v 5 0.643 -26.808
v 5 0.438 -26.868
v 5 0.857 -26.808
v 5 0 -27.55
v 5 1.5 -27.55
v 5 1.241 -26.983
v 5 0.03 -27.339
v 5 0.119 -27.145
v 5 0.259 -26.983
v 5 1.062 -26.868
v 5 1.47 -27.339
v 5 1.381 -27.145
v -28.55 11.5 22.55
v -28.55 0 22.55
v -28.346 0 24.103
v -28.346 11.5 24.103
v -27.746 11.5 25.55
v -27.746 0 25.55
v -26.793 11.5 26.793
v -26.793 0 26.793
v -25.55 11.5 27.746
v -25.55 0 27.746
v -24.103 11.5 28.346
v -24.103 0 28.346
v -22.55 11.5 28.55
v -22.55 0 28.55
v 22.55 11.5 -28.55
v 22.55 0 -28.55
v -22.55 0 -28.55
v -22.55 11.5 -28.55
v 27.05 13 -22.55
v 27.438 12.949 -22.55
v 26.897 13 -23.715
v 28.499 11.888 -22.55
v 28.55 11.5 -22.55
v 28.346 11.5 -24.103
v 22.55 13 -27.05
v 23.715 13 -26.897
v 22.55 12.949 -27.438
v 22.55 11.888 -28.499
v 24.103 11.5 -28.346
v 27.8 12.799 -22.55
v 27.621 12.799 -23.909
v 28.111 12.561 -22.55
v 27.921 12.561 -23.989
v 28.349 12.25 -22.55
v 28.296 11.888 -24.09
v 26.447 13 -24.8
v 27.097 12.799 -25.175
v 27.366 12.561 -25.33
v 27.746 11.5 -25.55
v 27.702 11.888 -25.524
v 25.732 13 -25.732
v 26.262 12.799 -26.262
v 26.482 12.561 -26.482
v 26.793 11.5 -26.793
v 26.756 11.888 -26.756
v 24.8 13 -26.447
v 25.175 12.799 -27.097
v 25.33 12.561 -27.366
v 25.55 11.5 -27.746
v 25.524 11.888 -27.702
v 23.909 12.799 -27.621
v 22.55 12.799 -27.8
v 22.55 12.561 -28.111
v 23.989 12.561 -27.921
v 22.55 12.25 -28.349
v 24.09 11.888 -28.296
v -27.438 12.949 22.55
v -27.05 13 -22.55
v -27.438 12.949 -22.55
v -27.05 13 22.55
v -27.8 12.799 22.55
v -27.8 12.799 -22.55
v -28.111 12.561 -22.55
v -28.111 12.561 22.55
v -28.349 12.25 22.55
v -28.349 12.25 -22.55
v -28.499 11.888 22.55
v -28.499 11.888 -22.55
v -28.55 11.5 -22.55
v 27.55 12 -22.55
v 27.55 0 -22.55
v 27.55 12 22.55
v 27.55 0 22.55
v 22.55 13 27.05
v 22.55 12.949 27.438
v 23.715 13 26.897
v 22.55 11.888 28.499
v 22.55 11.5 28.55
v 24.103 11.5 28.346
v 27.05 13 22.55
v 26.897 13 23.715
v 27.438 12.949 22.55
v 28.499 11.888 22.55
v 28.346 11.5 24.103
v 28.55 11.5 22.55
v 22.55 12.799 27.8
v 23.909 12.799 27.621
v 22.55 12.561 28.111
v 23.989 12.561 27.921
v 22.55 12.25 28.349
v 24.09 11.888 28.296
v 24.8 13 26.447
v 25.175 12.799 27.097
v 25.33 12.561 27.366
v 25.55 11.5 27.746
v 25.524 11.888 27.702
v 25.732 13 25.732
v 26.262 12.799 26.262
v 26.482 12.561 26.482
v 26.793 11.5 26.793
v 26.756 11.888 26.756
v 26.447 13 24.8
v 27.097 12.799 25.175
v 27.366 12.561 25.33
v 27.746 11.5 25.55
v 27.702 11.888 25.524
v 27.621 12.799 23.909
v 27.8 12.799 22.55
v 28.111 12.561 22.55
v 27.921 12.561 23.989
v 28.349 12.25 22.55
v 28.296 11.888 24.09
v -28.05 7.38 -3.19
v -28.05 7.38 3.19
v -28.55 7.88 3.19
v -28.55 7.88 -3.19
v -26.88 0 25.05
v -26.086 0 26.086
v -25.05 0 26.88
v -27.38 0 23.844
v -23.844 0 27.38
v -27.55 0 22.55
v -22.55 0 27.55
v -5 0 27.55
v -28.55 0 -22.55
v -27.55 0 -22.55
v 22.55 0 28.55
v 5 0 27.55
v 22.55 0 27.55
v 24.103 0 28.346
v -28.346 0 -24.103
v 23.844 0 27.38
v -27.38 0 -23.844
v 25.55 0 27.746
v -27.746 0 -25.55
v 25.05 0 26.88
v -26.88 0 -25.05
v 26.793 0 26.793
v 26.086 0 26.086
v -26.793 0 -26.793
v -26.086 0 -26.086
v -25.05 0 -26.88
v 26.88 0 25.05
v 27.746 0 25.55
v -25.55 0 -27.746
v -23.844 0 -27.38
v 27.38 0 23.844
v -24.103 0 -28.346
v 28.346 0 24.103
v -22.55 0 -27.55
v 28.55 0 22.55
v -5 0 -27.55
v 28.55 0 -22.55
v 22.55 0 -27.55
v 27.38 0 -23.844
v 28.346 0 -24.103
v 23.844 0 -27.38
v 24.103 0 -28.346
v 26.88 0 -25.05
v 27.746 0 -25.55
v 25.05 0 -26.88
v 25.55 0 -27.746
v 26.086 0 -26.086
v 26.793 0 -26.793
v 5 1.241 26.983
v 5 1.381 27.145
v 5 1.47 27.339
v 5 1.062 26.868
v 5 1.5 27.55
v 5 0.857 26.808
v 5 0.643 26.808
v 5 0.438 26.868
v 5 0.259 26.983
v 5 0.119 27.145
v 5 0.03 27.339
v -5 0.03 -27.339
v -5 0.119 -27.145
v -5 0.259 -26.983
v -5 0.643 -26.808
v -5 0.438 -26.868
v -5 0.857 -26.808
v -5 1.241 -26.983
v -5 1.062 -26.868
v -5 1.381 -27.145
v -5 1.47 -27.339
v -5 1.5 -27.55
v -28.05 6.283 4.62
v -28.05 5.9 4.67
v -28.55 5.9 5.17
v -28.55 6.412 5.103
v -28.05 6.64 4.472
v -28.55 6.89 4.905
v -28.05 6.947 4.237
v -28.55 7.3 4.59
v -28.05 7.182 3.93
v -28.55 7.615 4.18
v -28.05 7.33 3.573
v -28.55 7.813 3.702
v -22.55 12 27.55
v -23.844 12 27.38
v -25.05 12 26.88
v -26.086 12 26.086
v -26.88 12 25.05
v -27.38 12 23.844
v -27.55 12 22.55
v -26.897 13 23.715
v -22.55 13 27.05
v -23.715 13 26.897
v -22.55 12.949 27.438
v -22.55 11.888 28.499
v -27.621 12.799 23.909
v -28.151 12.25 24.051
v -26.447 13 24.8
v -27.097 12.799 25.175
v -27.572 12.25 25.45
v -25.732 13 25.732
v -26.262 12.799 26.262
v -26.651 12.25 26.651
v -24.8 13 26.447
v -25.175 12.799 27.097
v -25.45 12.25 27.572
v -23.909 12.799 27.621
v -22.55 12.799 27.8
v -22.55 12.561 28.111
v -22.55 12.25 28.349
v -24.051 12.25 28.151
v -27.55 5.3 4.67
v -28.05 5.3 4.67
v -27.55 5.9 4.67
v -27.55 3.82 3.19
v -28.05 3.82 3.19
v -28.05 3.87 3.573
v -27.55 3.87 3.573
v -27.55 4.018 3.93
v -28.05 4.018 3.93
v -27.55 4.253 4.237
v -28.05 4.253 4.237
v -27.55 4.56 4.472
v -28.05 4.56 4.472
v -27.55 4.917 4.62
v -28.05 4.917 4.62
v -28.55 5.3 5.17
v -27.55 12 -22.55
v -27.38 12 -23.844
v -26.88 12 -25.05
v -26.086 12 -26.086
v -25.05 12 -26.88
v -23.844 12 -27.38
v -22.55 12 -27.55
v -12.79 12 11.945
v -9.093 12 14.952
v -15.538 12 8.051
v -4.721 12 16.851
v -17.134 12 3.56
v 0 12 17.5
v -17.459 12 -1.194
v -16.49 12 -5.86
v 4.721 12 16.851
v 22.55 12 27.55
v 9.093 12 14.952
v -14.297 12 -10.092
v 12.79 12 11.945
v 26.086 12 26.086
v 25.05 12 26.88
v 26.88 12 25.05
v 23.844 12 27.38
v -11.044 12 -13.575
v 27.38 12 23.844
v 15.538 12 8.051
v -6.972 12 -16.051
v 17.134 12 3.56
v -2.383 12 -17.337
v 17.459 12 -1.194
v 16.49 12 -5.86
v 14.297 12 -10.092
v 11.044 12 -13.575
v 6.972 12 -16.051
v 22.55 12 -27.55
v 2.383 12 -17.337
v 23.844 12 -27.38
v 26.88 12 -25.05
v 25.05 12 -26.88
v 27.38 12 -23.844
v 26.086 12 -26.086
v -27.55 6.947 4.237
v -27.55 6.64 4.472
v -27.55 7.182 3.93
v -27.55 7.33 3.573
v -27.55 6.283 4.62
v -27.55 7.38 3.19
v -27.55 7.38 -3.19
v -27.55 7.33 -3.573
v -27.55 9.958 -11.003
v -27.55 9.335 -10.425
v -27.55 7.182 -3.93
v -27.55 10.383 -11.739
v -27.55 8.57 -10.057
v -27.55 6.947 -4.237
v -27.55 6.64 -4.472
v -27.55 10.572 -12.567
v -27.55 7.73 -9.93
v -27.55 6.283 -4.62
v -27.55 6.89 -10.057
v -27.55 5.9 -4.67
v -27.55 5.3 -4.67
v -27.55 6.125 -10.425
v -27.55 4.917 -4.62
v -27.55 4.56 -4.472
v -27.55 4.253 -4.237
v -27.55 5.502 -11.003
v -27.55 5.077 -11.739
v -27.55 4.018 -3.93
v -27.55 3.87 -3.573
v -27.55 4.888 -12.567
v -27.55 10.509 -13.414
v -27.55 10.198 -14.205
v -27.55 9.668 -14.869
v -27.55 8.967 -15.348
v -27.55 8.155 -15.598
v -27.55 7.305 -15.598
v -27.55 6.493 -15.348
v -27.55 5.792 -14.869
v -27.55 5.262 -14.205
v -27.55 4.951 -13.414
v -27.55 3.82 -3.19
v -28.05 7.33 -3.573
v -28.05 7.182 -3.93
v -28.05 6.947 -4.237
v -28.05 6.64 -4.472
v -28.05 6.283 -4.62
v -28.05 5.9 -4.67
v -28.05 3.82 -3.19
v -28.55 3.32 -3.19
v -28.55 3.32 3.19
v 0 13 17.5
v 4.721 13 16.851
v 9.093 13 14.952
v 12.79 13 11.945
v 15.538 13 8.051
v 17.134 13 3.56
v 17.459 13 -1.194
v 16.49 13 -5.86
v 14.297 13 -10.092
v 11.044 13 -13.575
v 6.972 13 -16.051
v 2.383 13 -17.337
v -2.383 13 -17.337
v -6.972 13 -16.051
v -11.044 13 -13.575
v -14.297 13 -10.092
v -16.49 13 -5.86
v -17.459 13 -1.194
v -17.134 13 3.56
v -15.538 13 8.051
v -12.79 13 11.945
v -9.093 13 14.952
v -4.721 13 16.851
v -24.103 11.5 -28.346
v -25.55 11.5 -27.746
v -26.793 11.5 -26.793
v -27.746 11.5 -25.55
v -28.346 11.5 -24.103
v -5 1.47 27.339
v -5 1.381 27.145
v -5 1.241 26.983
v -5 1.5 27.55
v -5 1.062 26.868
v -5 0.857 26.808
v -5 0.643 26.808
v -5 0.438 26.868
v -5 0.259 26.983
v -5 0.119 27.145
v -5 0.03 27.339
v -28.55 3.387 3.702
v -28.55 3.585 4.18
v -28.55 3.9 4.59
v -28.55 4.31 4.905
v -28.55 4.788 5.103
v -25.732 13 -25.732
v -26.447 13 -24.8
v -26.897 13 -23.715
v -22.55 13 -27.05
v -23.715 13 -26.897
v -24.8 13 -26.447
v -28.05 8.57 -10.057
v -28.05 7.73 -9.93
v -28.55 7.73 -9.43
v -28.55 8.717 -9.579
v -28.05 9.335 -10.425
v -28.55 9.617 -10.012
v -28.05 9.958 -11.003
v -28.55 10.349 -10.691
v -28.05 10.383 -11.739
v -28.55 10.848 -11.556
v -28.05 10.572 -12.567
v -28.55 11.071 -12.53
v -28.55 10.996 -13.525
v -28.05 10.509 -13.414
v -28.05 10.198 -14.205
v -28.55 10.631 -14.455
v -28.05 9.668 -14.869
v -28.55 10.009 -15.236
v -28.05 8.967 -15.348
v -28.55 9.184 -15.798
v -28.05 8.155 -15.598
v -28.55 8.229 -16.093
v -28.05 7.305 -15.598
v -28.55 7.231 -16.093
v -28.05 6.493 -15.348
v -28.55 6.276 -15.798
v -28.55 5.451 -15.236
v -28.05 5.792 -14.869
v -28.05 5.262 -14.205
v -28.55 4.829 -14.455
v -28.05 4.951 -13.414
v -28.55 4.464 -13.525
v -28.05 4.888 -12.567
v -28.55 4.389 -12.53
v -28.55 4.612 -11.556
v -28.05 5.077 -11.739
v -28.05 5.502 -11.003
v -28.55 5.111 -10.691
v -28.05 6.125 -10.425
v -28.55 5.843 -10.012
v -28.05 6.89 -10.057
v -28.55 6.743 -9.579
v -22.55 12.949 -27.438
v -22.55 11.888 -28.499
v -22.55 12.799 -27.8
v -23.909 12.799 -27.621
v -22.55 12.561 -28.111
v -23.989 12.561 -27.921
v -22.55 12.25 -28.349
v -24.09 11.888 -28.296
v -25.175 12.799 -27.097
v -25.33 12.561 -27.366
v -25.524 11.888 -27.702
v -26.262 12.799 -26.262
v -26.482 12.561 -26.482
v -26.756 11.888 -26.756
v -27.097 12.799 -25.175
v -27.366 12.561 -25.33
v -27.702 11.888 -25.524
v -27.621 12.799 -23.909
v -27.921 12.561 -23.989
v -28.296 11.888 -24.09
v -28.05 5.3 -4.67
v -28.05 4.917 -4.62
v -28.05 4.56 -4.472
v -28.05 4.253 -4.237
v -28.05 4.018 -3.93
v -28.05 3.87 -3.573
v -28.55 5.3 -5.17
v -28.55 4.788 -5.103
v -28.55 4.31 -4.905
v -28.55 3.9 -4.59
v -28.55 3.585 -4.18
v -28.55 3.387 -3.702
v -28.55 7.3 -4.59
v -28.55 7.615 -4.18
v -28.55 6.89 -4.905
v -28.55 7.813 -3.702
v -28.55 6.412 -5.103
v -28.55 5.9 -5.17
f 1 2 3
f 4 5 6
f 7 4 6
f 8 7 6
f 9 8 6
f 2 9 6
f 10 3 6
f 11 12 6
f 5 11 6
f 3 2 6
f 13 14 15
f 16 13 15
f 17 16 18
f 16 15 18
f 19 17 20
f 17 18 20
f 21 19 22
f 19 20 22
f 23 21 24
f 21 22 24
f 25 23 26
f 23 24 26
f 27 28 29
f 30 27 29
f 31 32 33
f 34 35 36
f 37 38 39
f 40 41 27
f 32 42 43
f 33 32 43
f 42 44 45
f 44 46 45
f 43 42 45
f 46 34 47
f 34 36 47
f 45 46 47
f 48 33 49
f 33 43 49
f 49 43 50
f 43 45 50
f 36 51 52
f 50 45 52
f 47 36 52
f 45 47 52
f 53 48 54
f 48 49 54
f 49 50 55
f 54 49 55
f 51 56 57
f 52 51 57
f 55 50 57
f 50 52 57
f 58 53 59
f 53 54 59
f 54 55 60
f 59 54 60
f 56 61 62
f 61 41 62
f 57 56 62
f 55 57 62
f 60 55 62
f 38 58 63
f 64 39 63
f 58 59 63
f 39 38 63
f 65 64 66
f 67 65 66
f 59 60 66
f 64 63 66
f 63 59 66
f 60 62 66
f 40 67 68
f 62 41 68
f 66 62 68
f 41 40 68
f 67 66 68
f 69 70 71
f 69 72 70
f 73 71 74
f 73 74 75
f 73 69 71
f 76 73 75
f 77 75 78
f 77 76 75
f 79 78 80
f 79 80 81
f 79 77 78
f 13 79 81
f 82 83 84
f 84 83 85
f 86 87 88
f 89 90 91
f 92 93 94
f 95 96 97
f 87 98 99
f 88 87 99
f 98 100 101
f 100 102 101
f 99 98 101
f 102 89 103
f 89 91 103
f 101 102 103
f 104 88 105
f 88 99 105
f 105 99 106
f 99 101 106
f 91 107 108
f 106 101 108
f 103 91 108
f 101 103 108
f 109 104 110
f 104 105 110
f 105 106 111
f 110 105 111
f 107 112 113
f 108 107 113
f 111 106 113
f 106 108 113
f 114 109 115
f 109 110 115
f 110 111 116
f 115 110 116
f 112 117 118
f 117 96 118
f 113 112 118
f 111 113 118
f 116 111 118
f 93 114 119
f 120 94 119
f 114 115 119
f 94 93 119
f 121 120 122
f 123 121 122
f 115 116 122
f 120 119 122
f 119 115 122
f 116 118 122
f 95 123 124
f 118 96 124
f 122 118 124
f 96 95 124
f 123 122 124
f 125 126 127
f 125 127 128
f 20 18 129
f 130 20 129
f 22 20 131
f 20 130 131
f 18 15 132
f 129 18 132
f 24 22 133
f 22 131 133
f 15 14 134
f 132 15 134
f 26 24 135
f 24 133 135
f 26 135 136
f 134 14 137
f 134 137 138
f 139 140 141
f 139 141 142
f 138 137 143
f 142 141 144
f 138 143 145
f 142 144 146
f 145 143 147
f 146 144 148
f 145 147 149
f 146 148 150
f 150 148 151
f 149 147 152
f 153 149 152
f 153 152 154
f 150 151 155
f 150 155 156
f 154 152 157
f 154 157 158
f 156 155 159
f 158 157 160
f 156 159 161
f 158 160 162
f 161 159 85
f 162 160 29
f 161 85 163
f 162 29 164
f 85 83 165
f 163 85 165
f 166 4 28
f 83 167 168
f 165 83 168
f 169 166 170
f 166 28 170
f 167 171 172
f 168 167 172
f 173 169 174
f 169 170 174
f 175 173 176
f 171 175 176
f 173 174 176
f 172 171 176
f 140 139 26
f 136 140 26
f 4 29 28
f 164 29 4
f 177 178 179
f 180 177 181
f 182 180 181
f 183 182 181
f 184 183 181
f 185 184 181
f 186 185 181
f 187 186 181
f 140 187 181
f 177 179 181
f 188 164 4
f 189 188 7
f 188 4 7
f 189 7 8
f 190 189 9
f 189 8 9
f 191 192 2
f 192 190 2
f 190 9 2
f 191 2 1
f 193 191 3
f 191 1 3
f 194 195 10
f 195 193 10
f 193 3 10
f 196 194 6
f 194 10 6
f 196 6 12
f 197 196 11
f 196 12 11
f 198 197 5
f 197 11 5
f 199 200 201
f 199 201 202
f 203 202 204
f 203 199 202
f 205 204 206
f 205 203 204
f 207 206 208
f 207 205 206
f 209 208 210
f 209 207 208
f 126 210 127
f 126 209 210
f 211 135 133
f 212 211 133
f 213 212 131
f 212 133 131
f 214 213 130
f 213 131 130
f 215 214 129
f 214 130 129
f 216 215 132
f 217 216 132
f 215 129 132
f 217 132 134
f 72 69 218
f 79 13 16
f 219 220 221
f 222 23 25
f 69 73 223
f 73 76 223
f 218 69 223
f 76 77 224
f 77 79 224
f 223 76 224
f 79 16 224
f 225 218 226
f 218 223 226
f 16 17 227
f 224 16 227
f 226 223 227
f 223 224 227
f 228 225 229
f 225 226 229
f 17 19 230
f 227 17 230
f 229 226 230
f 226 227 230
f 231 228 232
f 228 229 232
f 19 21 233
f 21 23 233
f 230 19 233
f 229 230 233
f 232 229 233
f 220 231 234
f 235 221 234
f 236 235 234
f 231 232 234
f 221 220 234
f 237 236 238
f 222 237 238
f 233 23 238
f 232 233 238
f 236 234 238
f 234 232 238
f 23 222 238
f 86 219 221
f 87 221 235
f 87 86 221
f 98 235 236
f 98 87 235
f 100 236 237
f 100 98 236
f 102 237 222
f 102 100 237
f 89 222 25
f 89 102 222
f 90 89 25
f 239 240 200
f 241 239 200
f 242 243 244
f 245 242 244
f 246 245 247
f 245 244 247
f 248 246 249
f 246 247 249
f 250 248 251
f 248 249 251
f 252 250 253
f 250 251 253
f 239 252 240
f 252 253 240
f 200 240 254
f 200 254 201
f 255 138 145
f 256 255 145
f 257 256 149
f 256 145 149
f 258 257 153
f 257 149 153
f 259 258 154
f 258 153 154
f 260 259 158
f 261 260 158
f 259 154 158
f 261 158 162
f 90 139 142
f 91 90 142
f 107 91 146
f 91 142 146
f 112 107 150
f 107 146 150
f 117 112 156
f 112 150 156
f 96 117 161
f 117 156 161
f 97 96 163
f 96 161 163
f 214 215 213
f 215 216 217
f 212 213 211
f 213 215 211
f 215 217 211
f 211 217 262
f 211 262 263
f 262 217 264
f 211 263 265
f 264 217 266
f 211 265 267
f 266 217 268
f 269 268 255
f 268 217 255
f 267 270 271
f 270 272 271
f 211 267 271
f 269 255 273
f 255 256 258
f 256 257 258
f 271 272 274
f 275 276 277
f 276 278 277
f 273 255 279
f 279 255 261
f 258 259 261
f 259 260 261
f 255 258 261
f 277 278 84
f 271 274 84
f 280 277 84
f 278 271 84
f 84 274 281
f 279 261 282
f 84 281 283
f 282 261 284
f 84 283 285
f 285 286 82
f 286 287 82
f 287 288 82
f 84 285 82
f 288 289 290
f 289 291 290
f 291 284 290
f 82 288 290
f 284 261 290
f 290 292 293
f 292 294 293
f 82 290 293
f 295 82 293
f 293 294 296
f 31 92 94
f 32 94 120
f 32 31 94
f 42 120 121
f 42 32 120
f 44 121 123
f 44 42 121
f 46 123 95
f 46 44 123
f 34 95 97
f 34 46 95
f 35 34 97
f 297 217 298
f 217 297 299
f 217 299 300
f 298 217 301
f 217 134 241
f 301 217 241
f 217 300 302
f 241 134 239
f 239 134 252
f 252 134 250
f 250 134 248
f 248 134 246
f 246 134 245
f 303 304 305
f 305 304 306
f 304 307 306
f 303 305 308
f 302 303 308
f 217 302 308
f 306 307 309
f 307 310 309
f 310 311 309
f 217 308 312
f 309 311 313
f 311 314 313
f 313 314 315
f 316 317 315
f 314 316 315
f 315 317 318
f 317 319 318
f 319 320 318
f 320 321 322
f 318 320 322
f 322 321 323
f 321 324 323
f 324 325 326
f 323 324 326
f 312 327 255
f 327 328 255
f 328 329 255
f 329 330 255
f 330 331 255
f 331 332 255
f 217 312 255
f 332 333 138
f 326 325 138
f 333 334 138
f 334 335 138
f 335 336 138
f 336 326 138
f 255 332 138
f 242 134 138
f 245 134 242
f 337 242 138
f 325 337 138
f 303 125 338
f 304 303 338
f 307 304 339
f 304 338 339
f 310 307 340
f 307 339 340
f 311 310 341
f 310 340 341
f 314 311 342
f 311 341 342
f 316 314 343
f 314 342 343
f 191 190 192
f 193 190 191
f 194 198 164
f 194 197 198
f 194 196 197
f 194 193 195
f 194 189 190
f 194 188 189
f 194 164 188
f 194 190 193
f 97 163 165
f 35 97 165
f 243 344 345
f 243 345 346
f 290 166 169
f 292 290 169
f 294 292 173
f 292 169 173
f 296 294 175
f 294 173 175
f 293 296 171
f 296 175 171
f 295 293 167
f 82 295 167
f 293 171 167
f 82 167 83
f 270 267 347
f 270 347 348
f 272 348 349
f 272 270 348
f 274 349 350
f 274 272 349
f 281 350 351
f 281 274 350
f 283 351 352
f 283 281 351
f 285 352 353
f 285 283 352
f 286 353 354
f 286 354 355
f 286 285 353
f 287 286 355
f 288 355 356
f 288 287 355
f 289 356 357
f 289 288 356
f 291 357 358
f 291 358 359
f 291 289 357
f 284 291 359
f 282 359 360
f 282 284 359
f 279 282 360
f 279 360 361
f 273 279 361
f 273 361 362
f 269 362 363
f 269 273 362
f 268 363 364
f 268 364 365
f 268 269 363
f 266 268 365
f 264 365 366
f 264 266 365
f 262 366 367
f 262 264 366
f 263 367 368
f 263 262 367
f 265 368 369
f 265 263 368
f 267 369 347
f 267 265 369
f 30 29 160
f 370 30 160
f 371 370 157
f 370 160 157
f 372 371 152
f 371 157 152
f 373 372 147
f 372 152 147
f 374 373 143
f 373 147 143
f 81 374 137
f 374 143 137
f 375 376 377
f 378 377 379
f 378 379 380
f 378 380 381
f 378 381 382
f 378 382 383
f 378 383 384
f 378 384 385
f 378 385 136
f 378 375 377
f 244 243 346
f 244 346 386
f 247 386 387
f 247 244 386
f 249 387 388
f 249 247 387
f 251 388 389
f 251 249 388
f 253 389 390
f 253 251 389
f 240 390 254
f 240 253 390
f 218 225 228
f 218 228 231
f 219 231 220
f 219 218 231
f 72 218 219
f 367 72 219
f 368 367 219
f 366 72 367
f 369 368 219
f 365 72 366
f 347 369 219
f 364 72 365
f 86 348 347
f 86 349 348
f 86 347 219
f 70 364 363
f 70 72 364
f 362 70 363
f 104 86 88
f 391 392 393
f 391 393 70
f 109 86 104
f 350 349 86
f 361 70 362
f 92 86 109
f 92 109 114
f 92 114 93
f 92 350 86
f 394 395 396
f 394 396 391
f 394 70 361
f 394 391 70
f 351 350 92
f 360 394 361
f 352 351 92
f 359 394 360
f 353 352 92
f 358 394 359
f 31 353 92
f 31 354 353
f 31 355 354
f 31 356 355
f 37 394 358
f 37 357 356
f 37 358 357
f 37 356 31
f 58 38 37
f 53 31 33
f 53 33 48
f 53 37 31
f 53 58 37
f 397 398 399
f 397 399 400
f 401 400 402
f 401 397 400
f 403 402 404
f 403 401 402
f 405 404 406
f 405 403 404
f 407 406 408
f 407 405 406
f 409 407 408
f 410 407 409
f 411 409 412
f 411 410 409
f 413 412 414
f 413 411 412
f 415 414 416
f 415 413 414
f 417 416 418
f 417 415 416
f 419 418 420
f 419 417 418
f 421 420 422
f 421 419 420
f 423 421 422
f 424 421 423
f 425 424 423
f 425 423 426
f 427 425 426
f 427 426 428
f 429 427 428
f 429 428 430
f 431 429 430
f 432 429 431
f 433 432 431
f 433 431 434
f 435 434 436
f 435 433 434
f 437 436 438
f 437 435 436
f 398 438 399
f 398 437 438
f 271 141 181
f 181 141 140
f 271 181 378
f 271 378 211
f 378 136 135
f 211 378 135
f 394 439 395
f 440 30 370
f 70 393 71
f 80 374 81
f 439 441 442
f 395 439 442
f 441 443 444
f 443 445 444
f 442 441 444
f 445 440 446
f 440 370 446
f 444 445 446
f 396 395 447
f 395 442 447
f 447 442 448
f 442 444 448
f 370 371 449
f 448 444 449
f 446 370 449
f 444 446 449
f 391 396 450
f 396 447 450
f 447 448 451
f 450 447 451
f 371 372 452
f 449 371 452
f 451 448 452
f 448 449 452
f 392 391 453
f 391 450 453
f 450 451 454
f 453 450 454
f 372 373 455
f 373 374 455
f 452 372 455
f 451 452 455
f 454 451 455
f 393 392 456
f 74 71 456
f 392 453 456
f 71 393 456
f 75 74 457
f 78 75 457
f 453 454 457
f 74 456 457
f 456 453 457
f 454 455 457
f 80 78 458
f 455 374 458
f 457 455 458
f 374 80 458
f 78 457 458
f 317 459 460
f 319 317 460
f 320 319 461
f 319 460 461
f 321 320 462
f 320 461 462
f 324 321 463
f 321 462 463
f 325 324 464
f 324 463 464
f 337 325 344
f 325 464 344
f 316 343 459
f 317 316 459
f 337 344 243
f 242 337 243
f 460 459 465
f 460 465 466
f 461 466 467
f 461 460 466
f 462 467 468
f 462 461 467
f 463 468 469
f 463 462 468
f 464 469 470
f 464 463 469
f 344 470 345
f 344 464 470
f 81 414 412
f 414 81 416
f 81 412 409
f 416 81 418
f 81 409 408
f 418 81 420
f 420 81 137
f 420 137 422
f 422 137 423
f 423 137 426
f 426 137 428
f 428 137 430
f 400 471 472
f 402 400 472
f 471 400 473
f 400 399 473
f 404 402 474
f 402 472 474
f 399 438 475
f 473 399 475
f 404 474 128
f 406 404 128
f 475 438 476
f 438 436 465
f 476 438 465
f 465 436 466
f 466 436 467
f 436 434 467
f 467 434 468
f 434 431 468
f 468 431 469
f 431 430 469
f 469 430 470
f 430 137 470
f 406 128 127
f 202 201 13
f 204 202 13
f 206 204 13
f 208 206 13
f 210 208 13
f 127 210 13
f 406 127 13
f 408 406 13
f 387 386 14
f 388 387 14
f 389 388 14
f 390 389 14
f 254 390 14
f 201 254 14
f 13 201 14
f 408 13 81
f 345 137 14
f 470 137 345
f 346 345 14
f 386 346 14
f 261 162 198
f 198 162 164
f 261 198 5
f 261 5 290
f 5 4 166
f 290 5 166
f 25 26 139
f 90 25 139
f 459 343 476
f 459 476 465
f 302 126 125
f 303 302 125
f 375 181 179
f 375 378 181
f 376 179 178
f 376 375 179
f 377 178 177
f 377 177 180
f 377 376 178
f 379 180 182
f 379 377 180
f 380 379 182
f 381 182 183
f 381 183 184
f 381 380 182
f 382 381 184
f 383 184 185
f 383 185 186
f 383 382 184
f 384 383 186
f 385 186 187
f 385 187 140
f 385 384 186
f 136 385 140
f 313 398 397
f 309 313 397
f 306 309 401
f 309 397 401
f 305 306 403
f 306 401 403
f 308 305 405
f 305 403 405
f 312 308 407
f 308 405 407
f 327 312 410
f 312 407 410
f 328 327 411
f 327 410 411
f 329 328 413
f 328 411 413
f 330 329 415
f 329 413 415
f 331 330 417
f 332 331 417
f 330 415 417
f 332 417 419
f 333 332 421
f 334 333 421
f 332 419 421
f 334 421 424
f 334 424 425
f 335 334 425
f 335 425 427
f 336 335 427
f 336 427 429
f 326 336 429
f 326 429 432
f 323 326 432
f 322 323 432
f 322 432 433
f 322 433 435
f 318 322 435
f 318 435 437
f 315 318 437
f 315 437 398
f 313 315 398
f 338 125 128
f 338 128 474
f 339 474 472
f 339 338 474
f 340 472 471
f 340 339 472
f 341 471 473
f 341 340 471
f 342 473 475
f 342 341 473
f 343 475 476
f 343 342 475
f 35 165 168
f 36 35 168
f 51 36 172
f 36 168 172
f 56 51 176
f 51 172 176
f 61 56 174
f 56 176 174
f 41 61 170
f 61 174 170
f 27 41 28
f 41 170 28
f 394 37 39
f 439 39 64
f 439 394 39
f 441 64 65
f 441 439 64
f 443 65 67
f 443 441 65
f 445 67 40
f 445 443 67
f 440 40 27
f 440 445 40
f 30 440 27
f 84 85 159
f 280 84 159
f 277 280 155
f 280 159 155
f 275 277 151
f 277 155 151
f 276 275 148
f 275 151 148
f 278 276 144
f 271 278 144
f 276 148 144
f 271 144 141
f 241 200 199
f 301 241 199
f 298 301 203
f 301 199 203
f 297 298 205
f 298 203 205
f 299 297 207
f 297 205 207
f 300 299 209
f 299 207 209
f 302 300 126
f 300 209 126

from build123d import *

# Parameters (mm, degrees)
BOSS_EXTRUDE1_DEPTH = 12
SKETCH2_R           = 17.5
BOSS_EXTRUDE2_DEPTH = 1
SKETCH3_R           = 0.75
BOSS_EXTRUDE3_DEPTH = 5
FILLET1_R           = 1.5
CUT_EXTRUDE6_REACH  = 67.15
SKETCH6_R           = 2.85
CHAMFER1_SIZE       = 0.5


with BuildPart() as part:
    # Sketch1 → Boss-Extrude1 (new body)
    with BuildSketch(Plane(origin=(0, 0, 0), x_dir=(1, 0, 0), z_dir=(0, 1, 0))):
        with BuildLine():
            Line((-28.55, 22.55), (-28.55, -22.55))
            ThreePointArc((-28.55, -22.55), (-26.792640687, -26.792640687), (-22.55, -28.55))
            Line((-22.55, -28.55), (22.55, -28.55))
            ThreePointArc((22.55, -28.55), (26.792640687, -26.792640687), (28.55, -22.55))
            Line((28.55, -22.55), (28.55, 22.55))
            ThreePointArc((28.55, 22.55), (26.792640687, 26.792640687), (22.55, 28.55))
            Line((22.55, 28.55), (-22.55, 28.55))
            ThreePointArc((-22.55, 28.55), (-26.792640687, 26.792640687), (-28.55, 22.55))
        make_face()
        with BuildLine():
            Line((-22.55, 27.55), (22.55, 27.55))
            ThreePointArc((22.55, 27.55), (26.085533906, 26.085533906), (27.55, 22.55))
            Line((27.55, 22.55), (27.55, -22.55))
            ThreePointArc((27.55, -22.55), (26.085533906, -26.085533906), (22.55, -27.55))
            Line((22.55, -27.55), (-22.55, -27.55))
            ThreePointArc((-22.55, -27.55), (-26.085533906, -26.085533906), (-27.55, -22.55))
            Line((-27.55, -22.55), (-27.55, 22.55))
            ThreePointArc((-27.55, 22.55), (-26.085533906, 26.085533906), (-22.55, 27.55))
        make_face(mode=Mode.SUBTRACT)
    extrude(amount=BOSS_EXTRUDE1_DEPTH)

    # Sketch2 → Boss-Extrude2 (add)
    with BuildSketch(Plane(origin=(0, 12, 0), x_dir=(1, 0, 0), z_dir=(0, 1, 0))):
        with BuildLine():
            Line((-22.55, -28.55), (22.55, -28.55))
            ThreePointArc((22.55, -28.55), (26.792640687, -26.792640687), (28.55, -22.55))
            Line((28.55, -22.55), (28.55, 22.55))
            ThreePointArc((28.55, 22.55), (26.792640687, 26.792640687), (22.55, 28.55))
            Line((22.55, 28.55), (-22.55, 28.55))
            ThreePointArc((-22.55, 28.55), (-26.792640687, 26.792640687), (-28.55, 22.55))
            Line((-28.55, 22.55), (-28.55, -22.55))
            ThreePointArc((-28.55, -22.55), (-26.792640687, -26.792640687), (-22.55, -28.55))
        make_face()
        with Locations(Location((0, 0, 0), (0, 0, 270))):
            Circle(SKETCH2_R, mode=Mode.SUBTRACT)
    extrude(amount=BOSS_EXTRUDE2_DEPTH)

    # Sketch3 → Boss-Extrude3 (add, symmetric)
    with BuildSketch(Plane.ZY):
        with Locations((-27.55, 0.75)):
            Circle(SKETCH3_R)
        with Locations((27.55, 0.75)):
            Circle(SKETCH3_R)
    extrude(amount=BOSS_EXTRUDE3_DEPTH, both=True)

    # Fillet1
    fillet1_edges = [part.edges().sort_by_distance(p)[0] for p in [
        (-26.792640687, 13, 26.792640687),
        (0, 13, 28.55),
        (26.792640687, 13, 26.792640687),
        (28.55, 13, 0),
        (26.792640687, 13, -26.792640687),
        (0, 13, -28.55),
        (-26.792640687, 13, -26.792640687),
        (-28.55, 13, 0),
    ]]
    fillet(fillet1_edges, radius=FILLET1_R)

    # Sketch6 → Cut-Extrude6 (cut, up to next)
    with BuildSketch(Plane.ZY.offset(28.55), mode=Mode.PRIVATE) as cut_extrude6_sk1:
        with Locations((-12.78, 7.73)):
            Circle(SKETCH6_R)
    cut_extrude6_tool1 = extrude(cut_extrude6_sk1.sketch, amount=-CUT_EXTRUDE6_REACH, mode=Mode.PRIVATE) & part.part
    # Sketch6 → Cut-Extrude6 (cut, up to next)
    with BuildSketch(Plane.ZY.offset(28.55), mode=Mode.PRIVATE) as cut_extrude6_sk2:
        with BuildLine():
            Line((-3.19, 3.82), (3.189999856, 3.82))
            ThreePointArc((3.189999856, 3.82), (4.236517943, 4.253481955), (4.67, 5.3))
            Line((4.67, 5.3), (4.67, 5.9))
            ThreePointArc((4.67, 5.9), (4.236518036, 6.946518036), (3.19, 7.38))
            Line((3.19, 7.38), (-3.19, 7.38))
            ThreePointArc((-3.19, 7.38), (-4.236518036, 6.946518036), (-4.67, 5.9))
            Line((-4.67, 5.9), (-4.67, 5.3))
            ThreePointArc((-4.67, 5.3), (-4.236518036, 4.253481964), (-3.19, 3.82))
        make_face()
    cut_extrude6_tool2 = extrude(cut_extrude6_sk2.sketch, amount=-CUT_EXTRUDE6_REACH, mode=Mode.PRIVATE) & part.part
    add(cut_extrude6_tool1.solids().sort_by_distance((-28.55, 7.73, -12.78))[0], mode=Mode.SUBTRACT)
    add(cut_extrude6_tool2.solids().sort_by_distance((-28.55, 5.6, 0))[0], mode=Mode.SUBTRACT)

    # Chamfer1
    chamfer1_edges = [part.edges().sort_by_distance(p)[0] for p in [
        (-28.55, 4.253481964, -4.236518036),
        (-28.55, 3.82, -7.2e-08),
        (-28.55, 4.253481955, 4.236517943),
        (-28.55, 5.6, 4.67),
        (-28.55, 6.946518036, 4.236518036),
        (-28.55, 7.38, 0),
        (-28.55, 6.946518036, -4.236518036),
        (-28.55, 5.6, -4.67),
        (-28.55, 7.73, -15.63),
    ]]
    chamfer(chamfer1_edges, length=CHAMFER1_SIZE)


solid = part.part
